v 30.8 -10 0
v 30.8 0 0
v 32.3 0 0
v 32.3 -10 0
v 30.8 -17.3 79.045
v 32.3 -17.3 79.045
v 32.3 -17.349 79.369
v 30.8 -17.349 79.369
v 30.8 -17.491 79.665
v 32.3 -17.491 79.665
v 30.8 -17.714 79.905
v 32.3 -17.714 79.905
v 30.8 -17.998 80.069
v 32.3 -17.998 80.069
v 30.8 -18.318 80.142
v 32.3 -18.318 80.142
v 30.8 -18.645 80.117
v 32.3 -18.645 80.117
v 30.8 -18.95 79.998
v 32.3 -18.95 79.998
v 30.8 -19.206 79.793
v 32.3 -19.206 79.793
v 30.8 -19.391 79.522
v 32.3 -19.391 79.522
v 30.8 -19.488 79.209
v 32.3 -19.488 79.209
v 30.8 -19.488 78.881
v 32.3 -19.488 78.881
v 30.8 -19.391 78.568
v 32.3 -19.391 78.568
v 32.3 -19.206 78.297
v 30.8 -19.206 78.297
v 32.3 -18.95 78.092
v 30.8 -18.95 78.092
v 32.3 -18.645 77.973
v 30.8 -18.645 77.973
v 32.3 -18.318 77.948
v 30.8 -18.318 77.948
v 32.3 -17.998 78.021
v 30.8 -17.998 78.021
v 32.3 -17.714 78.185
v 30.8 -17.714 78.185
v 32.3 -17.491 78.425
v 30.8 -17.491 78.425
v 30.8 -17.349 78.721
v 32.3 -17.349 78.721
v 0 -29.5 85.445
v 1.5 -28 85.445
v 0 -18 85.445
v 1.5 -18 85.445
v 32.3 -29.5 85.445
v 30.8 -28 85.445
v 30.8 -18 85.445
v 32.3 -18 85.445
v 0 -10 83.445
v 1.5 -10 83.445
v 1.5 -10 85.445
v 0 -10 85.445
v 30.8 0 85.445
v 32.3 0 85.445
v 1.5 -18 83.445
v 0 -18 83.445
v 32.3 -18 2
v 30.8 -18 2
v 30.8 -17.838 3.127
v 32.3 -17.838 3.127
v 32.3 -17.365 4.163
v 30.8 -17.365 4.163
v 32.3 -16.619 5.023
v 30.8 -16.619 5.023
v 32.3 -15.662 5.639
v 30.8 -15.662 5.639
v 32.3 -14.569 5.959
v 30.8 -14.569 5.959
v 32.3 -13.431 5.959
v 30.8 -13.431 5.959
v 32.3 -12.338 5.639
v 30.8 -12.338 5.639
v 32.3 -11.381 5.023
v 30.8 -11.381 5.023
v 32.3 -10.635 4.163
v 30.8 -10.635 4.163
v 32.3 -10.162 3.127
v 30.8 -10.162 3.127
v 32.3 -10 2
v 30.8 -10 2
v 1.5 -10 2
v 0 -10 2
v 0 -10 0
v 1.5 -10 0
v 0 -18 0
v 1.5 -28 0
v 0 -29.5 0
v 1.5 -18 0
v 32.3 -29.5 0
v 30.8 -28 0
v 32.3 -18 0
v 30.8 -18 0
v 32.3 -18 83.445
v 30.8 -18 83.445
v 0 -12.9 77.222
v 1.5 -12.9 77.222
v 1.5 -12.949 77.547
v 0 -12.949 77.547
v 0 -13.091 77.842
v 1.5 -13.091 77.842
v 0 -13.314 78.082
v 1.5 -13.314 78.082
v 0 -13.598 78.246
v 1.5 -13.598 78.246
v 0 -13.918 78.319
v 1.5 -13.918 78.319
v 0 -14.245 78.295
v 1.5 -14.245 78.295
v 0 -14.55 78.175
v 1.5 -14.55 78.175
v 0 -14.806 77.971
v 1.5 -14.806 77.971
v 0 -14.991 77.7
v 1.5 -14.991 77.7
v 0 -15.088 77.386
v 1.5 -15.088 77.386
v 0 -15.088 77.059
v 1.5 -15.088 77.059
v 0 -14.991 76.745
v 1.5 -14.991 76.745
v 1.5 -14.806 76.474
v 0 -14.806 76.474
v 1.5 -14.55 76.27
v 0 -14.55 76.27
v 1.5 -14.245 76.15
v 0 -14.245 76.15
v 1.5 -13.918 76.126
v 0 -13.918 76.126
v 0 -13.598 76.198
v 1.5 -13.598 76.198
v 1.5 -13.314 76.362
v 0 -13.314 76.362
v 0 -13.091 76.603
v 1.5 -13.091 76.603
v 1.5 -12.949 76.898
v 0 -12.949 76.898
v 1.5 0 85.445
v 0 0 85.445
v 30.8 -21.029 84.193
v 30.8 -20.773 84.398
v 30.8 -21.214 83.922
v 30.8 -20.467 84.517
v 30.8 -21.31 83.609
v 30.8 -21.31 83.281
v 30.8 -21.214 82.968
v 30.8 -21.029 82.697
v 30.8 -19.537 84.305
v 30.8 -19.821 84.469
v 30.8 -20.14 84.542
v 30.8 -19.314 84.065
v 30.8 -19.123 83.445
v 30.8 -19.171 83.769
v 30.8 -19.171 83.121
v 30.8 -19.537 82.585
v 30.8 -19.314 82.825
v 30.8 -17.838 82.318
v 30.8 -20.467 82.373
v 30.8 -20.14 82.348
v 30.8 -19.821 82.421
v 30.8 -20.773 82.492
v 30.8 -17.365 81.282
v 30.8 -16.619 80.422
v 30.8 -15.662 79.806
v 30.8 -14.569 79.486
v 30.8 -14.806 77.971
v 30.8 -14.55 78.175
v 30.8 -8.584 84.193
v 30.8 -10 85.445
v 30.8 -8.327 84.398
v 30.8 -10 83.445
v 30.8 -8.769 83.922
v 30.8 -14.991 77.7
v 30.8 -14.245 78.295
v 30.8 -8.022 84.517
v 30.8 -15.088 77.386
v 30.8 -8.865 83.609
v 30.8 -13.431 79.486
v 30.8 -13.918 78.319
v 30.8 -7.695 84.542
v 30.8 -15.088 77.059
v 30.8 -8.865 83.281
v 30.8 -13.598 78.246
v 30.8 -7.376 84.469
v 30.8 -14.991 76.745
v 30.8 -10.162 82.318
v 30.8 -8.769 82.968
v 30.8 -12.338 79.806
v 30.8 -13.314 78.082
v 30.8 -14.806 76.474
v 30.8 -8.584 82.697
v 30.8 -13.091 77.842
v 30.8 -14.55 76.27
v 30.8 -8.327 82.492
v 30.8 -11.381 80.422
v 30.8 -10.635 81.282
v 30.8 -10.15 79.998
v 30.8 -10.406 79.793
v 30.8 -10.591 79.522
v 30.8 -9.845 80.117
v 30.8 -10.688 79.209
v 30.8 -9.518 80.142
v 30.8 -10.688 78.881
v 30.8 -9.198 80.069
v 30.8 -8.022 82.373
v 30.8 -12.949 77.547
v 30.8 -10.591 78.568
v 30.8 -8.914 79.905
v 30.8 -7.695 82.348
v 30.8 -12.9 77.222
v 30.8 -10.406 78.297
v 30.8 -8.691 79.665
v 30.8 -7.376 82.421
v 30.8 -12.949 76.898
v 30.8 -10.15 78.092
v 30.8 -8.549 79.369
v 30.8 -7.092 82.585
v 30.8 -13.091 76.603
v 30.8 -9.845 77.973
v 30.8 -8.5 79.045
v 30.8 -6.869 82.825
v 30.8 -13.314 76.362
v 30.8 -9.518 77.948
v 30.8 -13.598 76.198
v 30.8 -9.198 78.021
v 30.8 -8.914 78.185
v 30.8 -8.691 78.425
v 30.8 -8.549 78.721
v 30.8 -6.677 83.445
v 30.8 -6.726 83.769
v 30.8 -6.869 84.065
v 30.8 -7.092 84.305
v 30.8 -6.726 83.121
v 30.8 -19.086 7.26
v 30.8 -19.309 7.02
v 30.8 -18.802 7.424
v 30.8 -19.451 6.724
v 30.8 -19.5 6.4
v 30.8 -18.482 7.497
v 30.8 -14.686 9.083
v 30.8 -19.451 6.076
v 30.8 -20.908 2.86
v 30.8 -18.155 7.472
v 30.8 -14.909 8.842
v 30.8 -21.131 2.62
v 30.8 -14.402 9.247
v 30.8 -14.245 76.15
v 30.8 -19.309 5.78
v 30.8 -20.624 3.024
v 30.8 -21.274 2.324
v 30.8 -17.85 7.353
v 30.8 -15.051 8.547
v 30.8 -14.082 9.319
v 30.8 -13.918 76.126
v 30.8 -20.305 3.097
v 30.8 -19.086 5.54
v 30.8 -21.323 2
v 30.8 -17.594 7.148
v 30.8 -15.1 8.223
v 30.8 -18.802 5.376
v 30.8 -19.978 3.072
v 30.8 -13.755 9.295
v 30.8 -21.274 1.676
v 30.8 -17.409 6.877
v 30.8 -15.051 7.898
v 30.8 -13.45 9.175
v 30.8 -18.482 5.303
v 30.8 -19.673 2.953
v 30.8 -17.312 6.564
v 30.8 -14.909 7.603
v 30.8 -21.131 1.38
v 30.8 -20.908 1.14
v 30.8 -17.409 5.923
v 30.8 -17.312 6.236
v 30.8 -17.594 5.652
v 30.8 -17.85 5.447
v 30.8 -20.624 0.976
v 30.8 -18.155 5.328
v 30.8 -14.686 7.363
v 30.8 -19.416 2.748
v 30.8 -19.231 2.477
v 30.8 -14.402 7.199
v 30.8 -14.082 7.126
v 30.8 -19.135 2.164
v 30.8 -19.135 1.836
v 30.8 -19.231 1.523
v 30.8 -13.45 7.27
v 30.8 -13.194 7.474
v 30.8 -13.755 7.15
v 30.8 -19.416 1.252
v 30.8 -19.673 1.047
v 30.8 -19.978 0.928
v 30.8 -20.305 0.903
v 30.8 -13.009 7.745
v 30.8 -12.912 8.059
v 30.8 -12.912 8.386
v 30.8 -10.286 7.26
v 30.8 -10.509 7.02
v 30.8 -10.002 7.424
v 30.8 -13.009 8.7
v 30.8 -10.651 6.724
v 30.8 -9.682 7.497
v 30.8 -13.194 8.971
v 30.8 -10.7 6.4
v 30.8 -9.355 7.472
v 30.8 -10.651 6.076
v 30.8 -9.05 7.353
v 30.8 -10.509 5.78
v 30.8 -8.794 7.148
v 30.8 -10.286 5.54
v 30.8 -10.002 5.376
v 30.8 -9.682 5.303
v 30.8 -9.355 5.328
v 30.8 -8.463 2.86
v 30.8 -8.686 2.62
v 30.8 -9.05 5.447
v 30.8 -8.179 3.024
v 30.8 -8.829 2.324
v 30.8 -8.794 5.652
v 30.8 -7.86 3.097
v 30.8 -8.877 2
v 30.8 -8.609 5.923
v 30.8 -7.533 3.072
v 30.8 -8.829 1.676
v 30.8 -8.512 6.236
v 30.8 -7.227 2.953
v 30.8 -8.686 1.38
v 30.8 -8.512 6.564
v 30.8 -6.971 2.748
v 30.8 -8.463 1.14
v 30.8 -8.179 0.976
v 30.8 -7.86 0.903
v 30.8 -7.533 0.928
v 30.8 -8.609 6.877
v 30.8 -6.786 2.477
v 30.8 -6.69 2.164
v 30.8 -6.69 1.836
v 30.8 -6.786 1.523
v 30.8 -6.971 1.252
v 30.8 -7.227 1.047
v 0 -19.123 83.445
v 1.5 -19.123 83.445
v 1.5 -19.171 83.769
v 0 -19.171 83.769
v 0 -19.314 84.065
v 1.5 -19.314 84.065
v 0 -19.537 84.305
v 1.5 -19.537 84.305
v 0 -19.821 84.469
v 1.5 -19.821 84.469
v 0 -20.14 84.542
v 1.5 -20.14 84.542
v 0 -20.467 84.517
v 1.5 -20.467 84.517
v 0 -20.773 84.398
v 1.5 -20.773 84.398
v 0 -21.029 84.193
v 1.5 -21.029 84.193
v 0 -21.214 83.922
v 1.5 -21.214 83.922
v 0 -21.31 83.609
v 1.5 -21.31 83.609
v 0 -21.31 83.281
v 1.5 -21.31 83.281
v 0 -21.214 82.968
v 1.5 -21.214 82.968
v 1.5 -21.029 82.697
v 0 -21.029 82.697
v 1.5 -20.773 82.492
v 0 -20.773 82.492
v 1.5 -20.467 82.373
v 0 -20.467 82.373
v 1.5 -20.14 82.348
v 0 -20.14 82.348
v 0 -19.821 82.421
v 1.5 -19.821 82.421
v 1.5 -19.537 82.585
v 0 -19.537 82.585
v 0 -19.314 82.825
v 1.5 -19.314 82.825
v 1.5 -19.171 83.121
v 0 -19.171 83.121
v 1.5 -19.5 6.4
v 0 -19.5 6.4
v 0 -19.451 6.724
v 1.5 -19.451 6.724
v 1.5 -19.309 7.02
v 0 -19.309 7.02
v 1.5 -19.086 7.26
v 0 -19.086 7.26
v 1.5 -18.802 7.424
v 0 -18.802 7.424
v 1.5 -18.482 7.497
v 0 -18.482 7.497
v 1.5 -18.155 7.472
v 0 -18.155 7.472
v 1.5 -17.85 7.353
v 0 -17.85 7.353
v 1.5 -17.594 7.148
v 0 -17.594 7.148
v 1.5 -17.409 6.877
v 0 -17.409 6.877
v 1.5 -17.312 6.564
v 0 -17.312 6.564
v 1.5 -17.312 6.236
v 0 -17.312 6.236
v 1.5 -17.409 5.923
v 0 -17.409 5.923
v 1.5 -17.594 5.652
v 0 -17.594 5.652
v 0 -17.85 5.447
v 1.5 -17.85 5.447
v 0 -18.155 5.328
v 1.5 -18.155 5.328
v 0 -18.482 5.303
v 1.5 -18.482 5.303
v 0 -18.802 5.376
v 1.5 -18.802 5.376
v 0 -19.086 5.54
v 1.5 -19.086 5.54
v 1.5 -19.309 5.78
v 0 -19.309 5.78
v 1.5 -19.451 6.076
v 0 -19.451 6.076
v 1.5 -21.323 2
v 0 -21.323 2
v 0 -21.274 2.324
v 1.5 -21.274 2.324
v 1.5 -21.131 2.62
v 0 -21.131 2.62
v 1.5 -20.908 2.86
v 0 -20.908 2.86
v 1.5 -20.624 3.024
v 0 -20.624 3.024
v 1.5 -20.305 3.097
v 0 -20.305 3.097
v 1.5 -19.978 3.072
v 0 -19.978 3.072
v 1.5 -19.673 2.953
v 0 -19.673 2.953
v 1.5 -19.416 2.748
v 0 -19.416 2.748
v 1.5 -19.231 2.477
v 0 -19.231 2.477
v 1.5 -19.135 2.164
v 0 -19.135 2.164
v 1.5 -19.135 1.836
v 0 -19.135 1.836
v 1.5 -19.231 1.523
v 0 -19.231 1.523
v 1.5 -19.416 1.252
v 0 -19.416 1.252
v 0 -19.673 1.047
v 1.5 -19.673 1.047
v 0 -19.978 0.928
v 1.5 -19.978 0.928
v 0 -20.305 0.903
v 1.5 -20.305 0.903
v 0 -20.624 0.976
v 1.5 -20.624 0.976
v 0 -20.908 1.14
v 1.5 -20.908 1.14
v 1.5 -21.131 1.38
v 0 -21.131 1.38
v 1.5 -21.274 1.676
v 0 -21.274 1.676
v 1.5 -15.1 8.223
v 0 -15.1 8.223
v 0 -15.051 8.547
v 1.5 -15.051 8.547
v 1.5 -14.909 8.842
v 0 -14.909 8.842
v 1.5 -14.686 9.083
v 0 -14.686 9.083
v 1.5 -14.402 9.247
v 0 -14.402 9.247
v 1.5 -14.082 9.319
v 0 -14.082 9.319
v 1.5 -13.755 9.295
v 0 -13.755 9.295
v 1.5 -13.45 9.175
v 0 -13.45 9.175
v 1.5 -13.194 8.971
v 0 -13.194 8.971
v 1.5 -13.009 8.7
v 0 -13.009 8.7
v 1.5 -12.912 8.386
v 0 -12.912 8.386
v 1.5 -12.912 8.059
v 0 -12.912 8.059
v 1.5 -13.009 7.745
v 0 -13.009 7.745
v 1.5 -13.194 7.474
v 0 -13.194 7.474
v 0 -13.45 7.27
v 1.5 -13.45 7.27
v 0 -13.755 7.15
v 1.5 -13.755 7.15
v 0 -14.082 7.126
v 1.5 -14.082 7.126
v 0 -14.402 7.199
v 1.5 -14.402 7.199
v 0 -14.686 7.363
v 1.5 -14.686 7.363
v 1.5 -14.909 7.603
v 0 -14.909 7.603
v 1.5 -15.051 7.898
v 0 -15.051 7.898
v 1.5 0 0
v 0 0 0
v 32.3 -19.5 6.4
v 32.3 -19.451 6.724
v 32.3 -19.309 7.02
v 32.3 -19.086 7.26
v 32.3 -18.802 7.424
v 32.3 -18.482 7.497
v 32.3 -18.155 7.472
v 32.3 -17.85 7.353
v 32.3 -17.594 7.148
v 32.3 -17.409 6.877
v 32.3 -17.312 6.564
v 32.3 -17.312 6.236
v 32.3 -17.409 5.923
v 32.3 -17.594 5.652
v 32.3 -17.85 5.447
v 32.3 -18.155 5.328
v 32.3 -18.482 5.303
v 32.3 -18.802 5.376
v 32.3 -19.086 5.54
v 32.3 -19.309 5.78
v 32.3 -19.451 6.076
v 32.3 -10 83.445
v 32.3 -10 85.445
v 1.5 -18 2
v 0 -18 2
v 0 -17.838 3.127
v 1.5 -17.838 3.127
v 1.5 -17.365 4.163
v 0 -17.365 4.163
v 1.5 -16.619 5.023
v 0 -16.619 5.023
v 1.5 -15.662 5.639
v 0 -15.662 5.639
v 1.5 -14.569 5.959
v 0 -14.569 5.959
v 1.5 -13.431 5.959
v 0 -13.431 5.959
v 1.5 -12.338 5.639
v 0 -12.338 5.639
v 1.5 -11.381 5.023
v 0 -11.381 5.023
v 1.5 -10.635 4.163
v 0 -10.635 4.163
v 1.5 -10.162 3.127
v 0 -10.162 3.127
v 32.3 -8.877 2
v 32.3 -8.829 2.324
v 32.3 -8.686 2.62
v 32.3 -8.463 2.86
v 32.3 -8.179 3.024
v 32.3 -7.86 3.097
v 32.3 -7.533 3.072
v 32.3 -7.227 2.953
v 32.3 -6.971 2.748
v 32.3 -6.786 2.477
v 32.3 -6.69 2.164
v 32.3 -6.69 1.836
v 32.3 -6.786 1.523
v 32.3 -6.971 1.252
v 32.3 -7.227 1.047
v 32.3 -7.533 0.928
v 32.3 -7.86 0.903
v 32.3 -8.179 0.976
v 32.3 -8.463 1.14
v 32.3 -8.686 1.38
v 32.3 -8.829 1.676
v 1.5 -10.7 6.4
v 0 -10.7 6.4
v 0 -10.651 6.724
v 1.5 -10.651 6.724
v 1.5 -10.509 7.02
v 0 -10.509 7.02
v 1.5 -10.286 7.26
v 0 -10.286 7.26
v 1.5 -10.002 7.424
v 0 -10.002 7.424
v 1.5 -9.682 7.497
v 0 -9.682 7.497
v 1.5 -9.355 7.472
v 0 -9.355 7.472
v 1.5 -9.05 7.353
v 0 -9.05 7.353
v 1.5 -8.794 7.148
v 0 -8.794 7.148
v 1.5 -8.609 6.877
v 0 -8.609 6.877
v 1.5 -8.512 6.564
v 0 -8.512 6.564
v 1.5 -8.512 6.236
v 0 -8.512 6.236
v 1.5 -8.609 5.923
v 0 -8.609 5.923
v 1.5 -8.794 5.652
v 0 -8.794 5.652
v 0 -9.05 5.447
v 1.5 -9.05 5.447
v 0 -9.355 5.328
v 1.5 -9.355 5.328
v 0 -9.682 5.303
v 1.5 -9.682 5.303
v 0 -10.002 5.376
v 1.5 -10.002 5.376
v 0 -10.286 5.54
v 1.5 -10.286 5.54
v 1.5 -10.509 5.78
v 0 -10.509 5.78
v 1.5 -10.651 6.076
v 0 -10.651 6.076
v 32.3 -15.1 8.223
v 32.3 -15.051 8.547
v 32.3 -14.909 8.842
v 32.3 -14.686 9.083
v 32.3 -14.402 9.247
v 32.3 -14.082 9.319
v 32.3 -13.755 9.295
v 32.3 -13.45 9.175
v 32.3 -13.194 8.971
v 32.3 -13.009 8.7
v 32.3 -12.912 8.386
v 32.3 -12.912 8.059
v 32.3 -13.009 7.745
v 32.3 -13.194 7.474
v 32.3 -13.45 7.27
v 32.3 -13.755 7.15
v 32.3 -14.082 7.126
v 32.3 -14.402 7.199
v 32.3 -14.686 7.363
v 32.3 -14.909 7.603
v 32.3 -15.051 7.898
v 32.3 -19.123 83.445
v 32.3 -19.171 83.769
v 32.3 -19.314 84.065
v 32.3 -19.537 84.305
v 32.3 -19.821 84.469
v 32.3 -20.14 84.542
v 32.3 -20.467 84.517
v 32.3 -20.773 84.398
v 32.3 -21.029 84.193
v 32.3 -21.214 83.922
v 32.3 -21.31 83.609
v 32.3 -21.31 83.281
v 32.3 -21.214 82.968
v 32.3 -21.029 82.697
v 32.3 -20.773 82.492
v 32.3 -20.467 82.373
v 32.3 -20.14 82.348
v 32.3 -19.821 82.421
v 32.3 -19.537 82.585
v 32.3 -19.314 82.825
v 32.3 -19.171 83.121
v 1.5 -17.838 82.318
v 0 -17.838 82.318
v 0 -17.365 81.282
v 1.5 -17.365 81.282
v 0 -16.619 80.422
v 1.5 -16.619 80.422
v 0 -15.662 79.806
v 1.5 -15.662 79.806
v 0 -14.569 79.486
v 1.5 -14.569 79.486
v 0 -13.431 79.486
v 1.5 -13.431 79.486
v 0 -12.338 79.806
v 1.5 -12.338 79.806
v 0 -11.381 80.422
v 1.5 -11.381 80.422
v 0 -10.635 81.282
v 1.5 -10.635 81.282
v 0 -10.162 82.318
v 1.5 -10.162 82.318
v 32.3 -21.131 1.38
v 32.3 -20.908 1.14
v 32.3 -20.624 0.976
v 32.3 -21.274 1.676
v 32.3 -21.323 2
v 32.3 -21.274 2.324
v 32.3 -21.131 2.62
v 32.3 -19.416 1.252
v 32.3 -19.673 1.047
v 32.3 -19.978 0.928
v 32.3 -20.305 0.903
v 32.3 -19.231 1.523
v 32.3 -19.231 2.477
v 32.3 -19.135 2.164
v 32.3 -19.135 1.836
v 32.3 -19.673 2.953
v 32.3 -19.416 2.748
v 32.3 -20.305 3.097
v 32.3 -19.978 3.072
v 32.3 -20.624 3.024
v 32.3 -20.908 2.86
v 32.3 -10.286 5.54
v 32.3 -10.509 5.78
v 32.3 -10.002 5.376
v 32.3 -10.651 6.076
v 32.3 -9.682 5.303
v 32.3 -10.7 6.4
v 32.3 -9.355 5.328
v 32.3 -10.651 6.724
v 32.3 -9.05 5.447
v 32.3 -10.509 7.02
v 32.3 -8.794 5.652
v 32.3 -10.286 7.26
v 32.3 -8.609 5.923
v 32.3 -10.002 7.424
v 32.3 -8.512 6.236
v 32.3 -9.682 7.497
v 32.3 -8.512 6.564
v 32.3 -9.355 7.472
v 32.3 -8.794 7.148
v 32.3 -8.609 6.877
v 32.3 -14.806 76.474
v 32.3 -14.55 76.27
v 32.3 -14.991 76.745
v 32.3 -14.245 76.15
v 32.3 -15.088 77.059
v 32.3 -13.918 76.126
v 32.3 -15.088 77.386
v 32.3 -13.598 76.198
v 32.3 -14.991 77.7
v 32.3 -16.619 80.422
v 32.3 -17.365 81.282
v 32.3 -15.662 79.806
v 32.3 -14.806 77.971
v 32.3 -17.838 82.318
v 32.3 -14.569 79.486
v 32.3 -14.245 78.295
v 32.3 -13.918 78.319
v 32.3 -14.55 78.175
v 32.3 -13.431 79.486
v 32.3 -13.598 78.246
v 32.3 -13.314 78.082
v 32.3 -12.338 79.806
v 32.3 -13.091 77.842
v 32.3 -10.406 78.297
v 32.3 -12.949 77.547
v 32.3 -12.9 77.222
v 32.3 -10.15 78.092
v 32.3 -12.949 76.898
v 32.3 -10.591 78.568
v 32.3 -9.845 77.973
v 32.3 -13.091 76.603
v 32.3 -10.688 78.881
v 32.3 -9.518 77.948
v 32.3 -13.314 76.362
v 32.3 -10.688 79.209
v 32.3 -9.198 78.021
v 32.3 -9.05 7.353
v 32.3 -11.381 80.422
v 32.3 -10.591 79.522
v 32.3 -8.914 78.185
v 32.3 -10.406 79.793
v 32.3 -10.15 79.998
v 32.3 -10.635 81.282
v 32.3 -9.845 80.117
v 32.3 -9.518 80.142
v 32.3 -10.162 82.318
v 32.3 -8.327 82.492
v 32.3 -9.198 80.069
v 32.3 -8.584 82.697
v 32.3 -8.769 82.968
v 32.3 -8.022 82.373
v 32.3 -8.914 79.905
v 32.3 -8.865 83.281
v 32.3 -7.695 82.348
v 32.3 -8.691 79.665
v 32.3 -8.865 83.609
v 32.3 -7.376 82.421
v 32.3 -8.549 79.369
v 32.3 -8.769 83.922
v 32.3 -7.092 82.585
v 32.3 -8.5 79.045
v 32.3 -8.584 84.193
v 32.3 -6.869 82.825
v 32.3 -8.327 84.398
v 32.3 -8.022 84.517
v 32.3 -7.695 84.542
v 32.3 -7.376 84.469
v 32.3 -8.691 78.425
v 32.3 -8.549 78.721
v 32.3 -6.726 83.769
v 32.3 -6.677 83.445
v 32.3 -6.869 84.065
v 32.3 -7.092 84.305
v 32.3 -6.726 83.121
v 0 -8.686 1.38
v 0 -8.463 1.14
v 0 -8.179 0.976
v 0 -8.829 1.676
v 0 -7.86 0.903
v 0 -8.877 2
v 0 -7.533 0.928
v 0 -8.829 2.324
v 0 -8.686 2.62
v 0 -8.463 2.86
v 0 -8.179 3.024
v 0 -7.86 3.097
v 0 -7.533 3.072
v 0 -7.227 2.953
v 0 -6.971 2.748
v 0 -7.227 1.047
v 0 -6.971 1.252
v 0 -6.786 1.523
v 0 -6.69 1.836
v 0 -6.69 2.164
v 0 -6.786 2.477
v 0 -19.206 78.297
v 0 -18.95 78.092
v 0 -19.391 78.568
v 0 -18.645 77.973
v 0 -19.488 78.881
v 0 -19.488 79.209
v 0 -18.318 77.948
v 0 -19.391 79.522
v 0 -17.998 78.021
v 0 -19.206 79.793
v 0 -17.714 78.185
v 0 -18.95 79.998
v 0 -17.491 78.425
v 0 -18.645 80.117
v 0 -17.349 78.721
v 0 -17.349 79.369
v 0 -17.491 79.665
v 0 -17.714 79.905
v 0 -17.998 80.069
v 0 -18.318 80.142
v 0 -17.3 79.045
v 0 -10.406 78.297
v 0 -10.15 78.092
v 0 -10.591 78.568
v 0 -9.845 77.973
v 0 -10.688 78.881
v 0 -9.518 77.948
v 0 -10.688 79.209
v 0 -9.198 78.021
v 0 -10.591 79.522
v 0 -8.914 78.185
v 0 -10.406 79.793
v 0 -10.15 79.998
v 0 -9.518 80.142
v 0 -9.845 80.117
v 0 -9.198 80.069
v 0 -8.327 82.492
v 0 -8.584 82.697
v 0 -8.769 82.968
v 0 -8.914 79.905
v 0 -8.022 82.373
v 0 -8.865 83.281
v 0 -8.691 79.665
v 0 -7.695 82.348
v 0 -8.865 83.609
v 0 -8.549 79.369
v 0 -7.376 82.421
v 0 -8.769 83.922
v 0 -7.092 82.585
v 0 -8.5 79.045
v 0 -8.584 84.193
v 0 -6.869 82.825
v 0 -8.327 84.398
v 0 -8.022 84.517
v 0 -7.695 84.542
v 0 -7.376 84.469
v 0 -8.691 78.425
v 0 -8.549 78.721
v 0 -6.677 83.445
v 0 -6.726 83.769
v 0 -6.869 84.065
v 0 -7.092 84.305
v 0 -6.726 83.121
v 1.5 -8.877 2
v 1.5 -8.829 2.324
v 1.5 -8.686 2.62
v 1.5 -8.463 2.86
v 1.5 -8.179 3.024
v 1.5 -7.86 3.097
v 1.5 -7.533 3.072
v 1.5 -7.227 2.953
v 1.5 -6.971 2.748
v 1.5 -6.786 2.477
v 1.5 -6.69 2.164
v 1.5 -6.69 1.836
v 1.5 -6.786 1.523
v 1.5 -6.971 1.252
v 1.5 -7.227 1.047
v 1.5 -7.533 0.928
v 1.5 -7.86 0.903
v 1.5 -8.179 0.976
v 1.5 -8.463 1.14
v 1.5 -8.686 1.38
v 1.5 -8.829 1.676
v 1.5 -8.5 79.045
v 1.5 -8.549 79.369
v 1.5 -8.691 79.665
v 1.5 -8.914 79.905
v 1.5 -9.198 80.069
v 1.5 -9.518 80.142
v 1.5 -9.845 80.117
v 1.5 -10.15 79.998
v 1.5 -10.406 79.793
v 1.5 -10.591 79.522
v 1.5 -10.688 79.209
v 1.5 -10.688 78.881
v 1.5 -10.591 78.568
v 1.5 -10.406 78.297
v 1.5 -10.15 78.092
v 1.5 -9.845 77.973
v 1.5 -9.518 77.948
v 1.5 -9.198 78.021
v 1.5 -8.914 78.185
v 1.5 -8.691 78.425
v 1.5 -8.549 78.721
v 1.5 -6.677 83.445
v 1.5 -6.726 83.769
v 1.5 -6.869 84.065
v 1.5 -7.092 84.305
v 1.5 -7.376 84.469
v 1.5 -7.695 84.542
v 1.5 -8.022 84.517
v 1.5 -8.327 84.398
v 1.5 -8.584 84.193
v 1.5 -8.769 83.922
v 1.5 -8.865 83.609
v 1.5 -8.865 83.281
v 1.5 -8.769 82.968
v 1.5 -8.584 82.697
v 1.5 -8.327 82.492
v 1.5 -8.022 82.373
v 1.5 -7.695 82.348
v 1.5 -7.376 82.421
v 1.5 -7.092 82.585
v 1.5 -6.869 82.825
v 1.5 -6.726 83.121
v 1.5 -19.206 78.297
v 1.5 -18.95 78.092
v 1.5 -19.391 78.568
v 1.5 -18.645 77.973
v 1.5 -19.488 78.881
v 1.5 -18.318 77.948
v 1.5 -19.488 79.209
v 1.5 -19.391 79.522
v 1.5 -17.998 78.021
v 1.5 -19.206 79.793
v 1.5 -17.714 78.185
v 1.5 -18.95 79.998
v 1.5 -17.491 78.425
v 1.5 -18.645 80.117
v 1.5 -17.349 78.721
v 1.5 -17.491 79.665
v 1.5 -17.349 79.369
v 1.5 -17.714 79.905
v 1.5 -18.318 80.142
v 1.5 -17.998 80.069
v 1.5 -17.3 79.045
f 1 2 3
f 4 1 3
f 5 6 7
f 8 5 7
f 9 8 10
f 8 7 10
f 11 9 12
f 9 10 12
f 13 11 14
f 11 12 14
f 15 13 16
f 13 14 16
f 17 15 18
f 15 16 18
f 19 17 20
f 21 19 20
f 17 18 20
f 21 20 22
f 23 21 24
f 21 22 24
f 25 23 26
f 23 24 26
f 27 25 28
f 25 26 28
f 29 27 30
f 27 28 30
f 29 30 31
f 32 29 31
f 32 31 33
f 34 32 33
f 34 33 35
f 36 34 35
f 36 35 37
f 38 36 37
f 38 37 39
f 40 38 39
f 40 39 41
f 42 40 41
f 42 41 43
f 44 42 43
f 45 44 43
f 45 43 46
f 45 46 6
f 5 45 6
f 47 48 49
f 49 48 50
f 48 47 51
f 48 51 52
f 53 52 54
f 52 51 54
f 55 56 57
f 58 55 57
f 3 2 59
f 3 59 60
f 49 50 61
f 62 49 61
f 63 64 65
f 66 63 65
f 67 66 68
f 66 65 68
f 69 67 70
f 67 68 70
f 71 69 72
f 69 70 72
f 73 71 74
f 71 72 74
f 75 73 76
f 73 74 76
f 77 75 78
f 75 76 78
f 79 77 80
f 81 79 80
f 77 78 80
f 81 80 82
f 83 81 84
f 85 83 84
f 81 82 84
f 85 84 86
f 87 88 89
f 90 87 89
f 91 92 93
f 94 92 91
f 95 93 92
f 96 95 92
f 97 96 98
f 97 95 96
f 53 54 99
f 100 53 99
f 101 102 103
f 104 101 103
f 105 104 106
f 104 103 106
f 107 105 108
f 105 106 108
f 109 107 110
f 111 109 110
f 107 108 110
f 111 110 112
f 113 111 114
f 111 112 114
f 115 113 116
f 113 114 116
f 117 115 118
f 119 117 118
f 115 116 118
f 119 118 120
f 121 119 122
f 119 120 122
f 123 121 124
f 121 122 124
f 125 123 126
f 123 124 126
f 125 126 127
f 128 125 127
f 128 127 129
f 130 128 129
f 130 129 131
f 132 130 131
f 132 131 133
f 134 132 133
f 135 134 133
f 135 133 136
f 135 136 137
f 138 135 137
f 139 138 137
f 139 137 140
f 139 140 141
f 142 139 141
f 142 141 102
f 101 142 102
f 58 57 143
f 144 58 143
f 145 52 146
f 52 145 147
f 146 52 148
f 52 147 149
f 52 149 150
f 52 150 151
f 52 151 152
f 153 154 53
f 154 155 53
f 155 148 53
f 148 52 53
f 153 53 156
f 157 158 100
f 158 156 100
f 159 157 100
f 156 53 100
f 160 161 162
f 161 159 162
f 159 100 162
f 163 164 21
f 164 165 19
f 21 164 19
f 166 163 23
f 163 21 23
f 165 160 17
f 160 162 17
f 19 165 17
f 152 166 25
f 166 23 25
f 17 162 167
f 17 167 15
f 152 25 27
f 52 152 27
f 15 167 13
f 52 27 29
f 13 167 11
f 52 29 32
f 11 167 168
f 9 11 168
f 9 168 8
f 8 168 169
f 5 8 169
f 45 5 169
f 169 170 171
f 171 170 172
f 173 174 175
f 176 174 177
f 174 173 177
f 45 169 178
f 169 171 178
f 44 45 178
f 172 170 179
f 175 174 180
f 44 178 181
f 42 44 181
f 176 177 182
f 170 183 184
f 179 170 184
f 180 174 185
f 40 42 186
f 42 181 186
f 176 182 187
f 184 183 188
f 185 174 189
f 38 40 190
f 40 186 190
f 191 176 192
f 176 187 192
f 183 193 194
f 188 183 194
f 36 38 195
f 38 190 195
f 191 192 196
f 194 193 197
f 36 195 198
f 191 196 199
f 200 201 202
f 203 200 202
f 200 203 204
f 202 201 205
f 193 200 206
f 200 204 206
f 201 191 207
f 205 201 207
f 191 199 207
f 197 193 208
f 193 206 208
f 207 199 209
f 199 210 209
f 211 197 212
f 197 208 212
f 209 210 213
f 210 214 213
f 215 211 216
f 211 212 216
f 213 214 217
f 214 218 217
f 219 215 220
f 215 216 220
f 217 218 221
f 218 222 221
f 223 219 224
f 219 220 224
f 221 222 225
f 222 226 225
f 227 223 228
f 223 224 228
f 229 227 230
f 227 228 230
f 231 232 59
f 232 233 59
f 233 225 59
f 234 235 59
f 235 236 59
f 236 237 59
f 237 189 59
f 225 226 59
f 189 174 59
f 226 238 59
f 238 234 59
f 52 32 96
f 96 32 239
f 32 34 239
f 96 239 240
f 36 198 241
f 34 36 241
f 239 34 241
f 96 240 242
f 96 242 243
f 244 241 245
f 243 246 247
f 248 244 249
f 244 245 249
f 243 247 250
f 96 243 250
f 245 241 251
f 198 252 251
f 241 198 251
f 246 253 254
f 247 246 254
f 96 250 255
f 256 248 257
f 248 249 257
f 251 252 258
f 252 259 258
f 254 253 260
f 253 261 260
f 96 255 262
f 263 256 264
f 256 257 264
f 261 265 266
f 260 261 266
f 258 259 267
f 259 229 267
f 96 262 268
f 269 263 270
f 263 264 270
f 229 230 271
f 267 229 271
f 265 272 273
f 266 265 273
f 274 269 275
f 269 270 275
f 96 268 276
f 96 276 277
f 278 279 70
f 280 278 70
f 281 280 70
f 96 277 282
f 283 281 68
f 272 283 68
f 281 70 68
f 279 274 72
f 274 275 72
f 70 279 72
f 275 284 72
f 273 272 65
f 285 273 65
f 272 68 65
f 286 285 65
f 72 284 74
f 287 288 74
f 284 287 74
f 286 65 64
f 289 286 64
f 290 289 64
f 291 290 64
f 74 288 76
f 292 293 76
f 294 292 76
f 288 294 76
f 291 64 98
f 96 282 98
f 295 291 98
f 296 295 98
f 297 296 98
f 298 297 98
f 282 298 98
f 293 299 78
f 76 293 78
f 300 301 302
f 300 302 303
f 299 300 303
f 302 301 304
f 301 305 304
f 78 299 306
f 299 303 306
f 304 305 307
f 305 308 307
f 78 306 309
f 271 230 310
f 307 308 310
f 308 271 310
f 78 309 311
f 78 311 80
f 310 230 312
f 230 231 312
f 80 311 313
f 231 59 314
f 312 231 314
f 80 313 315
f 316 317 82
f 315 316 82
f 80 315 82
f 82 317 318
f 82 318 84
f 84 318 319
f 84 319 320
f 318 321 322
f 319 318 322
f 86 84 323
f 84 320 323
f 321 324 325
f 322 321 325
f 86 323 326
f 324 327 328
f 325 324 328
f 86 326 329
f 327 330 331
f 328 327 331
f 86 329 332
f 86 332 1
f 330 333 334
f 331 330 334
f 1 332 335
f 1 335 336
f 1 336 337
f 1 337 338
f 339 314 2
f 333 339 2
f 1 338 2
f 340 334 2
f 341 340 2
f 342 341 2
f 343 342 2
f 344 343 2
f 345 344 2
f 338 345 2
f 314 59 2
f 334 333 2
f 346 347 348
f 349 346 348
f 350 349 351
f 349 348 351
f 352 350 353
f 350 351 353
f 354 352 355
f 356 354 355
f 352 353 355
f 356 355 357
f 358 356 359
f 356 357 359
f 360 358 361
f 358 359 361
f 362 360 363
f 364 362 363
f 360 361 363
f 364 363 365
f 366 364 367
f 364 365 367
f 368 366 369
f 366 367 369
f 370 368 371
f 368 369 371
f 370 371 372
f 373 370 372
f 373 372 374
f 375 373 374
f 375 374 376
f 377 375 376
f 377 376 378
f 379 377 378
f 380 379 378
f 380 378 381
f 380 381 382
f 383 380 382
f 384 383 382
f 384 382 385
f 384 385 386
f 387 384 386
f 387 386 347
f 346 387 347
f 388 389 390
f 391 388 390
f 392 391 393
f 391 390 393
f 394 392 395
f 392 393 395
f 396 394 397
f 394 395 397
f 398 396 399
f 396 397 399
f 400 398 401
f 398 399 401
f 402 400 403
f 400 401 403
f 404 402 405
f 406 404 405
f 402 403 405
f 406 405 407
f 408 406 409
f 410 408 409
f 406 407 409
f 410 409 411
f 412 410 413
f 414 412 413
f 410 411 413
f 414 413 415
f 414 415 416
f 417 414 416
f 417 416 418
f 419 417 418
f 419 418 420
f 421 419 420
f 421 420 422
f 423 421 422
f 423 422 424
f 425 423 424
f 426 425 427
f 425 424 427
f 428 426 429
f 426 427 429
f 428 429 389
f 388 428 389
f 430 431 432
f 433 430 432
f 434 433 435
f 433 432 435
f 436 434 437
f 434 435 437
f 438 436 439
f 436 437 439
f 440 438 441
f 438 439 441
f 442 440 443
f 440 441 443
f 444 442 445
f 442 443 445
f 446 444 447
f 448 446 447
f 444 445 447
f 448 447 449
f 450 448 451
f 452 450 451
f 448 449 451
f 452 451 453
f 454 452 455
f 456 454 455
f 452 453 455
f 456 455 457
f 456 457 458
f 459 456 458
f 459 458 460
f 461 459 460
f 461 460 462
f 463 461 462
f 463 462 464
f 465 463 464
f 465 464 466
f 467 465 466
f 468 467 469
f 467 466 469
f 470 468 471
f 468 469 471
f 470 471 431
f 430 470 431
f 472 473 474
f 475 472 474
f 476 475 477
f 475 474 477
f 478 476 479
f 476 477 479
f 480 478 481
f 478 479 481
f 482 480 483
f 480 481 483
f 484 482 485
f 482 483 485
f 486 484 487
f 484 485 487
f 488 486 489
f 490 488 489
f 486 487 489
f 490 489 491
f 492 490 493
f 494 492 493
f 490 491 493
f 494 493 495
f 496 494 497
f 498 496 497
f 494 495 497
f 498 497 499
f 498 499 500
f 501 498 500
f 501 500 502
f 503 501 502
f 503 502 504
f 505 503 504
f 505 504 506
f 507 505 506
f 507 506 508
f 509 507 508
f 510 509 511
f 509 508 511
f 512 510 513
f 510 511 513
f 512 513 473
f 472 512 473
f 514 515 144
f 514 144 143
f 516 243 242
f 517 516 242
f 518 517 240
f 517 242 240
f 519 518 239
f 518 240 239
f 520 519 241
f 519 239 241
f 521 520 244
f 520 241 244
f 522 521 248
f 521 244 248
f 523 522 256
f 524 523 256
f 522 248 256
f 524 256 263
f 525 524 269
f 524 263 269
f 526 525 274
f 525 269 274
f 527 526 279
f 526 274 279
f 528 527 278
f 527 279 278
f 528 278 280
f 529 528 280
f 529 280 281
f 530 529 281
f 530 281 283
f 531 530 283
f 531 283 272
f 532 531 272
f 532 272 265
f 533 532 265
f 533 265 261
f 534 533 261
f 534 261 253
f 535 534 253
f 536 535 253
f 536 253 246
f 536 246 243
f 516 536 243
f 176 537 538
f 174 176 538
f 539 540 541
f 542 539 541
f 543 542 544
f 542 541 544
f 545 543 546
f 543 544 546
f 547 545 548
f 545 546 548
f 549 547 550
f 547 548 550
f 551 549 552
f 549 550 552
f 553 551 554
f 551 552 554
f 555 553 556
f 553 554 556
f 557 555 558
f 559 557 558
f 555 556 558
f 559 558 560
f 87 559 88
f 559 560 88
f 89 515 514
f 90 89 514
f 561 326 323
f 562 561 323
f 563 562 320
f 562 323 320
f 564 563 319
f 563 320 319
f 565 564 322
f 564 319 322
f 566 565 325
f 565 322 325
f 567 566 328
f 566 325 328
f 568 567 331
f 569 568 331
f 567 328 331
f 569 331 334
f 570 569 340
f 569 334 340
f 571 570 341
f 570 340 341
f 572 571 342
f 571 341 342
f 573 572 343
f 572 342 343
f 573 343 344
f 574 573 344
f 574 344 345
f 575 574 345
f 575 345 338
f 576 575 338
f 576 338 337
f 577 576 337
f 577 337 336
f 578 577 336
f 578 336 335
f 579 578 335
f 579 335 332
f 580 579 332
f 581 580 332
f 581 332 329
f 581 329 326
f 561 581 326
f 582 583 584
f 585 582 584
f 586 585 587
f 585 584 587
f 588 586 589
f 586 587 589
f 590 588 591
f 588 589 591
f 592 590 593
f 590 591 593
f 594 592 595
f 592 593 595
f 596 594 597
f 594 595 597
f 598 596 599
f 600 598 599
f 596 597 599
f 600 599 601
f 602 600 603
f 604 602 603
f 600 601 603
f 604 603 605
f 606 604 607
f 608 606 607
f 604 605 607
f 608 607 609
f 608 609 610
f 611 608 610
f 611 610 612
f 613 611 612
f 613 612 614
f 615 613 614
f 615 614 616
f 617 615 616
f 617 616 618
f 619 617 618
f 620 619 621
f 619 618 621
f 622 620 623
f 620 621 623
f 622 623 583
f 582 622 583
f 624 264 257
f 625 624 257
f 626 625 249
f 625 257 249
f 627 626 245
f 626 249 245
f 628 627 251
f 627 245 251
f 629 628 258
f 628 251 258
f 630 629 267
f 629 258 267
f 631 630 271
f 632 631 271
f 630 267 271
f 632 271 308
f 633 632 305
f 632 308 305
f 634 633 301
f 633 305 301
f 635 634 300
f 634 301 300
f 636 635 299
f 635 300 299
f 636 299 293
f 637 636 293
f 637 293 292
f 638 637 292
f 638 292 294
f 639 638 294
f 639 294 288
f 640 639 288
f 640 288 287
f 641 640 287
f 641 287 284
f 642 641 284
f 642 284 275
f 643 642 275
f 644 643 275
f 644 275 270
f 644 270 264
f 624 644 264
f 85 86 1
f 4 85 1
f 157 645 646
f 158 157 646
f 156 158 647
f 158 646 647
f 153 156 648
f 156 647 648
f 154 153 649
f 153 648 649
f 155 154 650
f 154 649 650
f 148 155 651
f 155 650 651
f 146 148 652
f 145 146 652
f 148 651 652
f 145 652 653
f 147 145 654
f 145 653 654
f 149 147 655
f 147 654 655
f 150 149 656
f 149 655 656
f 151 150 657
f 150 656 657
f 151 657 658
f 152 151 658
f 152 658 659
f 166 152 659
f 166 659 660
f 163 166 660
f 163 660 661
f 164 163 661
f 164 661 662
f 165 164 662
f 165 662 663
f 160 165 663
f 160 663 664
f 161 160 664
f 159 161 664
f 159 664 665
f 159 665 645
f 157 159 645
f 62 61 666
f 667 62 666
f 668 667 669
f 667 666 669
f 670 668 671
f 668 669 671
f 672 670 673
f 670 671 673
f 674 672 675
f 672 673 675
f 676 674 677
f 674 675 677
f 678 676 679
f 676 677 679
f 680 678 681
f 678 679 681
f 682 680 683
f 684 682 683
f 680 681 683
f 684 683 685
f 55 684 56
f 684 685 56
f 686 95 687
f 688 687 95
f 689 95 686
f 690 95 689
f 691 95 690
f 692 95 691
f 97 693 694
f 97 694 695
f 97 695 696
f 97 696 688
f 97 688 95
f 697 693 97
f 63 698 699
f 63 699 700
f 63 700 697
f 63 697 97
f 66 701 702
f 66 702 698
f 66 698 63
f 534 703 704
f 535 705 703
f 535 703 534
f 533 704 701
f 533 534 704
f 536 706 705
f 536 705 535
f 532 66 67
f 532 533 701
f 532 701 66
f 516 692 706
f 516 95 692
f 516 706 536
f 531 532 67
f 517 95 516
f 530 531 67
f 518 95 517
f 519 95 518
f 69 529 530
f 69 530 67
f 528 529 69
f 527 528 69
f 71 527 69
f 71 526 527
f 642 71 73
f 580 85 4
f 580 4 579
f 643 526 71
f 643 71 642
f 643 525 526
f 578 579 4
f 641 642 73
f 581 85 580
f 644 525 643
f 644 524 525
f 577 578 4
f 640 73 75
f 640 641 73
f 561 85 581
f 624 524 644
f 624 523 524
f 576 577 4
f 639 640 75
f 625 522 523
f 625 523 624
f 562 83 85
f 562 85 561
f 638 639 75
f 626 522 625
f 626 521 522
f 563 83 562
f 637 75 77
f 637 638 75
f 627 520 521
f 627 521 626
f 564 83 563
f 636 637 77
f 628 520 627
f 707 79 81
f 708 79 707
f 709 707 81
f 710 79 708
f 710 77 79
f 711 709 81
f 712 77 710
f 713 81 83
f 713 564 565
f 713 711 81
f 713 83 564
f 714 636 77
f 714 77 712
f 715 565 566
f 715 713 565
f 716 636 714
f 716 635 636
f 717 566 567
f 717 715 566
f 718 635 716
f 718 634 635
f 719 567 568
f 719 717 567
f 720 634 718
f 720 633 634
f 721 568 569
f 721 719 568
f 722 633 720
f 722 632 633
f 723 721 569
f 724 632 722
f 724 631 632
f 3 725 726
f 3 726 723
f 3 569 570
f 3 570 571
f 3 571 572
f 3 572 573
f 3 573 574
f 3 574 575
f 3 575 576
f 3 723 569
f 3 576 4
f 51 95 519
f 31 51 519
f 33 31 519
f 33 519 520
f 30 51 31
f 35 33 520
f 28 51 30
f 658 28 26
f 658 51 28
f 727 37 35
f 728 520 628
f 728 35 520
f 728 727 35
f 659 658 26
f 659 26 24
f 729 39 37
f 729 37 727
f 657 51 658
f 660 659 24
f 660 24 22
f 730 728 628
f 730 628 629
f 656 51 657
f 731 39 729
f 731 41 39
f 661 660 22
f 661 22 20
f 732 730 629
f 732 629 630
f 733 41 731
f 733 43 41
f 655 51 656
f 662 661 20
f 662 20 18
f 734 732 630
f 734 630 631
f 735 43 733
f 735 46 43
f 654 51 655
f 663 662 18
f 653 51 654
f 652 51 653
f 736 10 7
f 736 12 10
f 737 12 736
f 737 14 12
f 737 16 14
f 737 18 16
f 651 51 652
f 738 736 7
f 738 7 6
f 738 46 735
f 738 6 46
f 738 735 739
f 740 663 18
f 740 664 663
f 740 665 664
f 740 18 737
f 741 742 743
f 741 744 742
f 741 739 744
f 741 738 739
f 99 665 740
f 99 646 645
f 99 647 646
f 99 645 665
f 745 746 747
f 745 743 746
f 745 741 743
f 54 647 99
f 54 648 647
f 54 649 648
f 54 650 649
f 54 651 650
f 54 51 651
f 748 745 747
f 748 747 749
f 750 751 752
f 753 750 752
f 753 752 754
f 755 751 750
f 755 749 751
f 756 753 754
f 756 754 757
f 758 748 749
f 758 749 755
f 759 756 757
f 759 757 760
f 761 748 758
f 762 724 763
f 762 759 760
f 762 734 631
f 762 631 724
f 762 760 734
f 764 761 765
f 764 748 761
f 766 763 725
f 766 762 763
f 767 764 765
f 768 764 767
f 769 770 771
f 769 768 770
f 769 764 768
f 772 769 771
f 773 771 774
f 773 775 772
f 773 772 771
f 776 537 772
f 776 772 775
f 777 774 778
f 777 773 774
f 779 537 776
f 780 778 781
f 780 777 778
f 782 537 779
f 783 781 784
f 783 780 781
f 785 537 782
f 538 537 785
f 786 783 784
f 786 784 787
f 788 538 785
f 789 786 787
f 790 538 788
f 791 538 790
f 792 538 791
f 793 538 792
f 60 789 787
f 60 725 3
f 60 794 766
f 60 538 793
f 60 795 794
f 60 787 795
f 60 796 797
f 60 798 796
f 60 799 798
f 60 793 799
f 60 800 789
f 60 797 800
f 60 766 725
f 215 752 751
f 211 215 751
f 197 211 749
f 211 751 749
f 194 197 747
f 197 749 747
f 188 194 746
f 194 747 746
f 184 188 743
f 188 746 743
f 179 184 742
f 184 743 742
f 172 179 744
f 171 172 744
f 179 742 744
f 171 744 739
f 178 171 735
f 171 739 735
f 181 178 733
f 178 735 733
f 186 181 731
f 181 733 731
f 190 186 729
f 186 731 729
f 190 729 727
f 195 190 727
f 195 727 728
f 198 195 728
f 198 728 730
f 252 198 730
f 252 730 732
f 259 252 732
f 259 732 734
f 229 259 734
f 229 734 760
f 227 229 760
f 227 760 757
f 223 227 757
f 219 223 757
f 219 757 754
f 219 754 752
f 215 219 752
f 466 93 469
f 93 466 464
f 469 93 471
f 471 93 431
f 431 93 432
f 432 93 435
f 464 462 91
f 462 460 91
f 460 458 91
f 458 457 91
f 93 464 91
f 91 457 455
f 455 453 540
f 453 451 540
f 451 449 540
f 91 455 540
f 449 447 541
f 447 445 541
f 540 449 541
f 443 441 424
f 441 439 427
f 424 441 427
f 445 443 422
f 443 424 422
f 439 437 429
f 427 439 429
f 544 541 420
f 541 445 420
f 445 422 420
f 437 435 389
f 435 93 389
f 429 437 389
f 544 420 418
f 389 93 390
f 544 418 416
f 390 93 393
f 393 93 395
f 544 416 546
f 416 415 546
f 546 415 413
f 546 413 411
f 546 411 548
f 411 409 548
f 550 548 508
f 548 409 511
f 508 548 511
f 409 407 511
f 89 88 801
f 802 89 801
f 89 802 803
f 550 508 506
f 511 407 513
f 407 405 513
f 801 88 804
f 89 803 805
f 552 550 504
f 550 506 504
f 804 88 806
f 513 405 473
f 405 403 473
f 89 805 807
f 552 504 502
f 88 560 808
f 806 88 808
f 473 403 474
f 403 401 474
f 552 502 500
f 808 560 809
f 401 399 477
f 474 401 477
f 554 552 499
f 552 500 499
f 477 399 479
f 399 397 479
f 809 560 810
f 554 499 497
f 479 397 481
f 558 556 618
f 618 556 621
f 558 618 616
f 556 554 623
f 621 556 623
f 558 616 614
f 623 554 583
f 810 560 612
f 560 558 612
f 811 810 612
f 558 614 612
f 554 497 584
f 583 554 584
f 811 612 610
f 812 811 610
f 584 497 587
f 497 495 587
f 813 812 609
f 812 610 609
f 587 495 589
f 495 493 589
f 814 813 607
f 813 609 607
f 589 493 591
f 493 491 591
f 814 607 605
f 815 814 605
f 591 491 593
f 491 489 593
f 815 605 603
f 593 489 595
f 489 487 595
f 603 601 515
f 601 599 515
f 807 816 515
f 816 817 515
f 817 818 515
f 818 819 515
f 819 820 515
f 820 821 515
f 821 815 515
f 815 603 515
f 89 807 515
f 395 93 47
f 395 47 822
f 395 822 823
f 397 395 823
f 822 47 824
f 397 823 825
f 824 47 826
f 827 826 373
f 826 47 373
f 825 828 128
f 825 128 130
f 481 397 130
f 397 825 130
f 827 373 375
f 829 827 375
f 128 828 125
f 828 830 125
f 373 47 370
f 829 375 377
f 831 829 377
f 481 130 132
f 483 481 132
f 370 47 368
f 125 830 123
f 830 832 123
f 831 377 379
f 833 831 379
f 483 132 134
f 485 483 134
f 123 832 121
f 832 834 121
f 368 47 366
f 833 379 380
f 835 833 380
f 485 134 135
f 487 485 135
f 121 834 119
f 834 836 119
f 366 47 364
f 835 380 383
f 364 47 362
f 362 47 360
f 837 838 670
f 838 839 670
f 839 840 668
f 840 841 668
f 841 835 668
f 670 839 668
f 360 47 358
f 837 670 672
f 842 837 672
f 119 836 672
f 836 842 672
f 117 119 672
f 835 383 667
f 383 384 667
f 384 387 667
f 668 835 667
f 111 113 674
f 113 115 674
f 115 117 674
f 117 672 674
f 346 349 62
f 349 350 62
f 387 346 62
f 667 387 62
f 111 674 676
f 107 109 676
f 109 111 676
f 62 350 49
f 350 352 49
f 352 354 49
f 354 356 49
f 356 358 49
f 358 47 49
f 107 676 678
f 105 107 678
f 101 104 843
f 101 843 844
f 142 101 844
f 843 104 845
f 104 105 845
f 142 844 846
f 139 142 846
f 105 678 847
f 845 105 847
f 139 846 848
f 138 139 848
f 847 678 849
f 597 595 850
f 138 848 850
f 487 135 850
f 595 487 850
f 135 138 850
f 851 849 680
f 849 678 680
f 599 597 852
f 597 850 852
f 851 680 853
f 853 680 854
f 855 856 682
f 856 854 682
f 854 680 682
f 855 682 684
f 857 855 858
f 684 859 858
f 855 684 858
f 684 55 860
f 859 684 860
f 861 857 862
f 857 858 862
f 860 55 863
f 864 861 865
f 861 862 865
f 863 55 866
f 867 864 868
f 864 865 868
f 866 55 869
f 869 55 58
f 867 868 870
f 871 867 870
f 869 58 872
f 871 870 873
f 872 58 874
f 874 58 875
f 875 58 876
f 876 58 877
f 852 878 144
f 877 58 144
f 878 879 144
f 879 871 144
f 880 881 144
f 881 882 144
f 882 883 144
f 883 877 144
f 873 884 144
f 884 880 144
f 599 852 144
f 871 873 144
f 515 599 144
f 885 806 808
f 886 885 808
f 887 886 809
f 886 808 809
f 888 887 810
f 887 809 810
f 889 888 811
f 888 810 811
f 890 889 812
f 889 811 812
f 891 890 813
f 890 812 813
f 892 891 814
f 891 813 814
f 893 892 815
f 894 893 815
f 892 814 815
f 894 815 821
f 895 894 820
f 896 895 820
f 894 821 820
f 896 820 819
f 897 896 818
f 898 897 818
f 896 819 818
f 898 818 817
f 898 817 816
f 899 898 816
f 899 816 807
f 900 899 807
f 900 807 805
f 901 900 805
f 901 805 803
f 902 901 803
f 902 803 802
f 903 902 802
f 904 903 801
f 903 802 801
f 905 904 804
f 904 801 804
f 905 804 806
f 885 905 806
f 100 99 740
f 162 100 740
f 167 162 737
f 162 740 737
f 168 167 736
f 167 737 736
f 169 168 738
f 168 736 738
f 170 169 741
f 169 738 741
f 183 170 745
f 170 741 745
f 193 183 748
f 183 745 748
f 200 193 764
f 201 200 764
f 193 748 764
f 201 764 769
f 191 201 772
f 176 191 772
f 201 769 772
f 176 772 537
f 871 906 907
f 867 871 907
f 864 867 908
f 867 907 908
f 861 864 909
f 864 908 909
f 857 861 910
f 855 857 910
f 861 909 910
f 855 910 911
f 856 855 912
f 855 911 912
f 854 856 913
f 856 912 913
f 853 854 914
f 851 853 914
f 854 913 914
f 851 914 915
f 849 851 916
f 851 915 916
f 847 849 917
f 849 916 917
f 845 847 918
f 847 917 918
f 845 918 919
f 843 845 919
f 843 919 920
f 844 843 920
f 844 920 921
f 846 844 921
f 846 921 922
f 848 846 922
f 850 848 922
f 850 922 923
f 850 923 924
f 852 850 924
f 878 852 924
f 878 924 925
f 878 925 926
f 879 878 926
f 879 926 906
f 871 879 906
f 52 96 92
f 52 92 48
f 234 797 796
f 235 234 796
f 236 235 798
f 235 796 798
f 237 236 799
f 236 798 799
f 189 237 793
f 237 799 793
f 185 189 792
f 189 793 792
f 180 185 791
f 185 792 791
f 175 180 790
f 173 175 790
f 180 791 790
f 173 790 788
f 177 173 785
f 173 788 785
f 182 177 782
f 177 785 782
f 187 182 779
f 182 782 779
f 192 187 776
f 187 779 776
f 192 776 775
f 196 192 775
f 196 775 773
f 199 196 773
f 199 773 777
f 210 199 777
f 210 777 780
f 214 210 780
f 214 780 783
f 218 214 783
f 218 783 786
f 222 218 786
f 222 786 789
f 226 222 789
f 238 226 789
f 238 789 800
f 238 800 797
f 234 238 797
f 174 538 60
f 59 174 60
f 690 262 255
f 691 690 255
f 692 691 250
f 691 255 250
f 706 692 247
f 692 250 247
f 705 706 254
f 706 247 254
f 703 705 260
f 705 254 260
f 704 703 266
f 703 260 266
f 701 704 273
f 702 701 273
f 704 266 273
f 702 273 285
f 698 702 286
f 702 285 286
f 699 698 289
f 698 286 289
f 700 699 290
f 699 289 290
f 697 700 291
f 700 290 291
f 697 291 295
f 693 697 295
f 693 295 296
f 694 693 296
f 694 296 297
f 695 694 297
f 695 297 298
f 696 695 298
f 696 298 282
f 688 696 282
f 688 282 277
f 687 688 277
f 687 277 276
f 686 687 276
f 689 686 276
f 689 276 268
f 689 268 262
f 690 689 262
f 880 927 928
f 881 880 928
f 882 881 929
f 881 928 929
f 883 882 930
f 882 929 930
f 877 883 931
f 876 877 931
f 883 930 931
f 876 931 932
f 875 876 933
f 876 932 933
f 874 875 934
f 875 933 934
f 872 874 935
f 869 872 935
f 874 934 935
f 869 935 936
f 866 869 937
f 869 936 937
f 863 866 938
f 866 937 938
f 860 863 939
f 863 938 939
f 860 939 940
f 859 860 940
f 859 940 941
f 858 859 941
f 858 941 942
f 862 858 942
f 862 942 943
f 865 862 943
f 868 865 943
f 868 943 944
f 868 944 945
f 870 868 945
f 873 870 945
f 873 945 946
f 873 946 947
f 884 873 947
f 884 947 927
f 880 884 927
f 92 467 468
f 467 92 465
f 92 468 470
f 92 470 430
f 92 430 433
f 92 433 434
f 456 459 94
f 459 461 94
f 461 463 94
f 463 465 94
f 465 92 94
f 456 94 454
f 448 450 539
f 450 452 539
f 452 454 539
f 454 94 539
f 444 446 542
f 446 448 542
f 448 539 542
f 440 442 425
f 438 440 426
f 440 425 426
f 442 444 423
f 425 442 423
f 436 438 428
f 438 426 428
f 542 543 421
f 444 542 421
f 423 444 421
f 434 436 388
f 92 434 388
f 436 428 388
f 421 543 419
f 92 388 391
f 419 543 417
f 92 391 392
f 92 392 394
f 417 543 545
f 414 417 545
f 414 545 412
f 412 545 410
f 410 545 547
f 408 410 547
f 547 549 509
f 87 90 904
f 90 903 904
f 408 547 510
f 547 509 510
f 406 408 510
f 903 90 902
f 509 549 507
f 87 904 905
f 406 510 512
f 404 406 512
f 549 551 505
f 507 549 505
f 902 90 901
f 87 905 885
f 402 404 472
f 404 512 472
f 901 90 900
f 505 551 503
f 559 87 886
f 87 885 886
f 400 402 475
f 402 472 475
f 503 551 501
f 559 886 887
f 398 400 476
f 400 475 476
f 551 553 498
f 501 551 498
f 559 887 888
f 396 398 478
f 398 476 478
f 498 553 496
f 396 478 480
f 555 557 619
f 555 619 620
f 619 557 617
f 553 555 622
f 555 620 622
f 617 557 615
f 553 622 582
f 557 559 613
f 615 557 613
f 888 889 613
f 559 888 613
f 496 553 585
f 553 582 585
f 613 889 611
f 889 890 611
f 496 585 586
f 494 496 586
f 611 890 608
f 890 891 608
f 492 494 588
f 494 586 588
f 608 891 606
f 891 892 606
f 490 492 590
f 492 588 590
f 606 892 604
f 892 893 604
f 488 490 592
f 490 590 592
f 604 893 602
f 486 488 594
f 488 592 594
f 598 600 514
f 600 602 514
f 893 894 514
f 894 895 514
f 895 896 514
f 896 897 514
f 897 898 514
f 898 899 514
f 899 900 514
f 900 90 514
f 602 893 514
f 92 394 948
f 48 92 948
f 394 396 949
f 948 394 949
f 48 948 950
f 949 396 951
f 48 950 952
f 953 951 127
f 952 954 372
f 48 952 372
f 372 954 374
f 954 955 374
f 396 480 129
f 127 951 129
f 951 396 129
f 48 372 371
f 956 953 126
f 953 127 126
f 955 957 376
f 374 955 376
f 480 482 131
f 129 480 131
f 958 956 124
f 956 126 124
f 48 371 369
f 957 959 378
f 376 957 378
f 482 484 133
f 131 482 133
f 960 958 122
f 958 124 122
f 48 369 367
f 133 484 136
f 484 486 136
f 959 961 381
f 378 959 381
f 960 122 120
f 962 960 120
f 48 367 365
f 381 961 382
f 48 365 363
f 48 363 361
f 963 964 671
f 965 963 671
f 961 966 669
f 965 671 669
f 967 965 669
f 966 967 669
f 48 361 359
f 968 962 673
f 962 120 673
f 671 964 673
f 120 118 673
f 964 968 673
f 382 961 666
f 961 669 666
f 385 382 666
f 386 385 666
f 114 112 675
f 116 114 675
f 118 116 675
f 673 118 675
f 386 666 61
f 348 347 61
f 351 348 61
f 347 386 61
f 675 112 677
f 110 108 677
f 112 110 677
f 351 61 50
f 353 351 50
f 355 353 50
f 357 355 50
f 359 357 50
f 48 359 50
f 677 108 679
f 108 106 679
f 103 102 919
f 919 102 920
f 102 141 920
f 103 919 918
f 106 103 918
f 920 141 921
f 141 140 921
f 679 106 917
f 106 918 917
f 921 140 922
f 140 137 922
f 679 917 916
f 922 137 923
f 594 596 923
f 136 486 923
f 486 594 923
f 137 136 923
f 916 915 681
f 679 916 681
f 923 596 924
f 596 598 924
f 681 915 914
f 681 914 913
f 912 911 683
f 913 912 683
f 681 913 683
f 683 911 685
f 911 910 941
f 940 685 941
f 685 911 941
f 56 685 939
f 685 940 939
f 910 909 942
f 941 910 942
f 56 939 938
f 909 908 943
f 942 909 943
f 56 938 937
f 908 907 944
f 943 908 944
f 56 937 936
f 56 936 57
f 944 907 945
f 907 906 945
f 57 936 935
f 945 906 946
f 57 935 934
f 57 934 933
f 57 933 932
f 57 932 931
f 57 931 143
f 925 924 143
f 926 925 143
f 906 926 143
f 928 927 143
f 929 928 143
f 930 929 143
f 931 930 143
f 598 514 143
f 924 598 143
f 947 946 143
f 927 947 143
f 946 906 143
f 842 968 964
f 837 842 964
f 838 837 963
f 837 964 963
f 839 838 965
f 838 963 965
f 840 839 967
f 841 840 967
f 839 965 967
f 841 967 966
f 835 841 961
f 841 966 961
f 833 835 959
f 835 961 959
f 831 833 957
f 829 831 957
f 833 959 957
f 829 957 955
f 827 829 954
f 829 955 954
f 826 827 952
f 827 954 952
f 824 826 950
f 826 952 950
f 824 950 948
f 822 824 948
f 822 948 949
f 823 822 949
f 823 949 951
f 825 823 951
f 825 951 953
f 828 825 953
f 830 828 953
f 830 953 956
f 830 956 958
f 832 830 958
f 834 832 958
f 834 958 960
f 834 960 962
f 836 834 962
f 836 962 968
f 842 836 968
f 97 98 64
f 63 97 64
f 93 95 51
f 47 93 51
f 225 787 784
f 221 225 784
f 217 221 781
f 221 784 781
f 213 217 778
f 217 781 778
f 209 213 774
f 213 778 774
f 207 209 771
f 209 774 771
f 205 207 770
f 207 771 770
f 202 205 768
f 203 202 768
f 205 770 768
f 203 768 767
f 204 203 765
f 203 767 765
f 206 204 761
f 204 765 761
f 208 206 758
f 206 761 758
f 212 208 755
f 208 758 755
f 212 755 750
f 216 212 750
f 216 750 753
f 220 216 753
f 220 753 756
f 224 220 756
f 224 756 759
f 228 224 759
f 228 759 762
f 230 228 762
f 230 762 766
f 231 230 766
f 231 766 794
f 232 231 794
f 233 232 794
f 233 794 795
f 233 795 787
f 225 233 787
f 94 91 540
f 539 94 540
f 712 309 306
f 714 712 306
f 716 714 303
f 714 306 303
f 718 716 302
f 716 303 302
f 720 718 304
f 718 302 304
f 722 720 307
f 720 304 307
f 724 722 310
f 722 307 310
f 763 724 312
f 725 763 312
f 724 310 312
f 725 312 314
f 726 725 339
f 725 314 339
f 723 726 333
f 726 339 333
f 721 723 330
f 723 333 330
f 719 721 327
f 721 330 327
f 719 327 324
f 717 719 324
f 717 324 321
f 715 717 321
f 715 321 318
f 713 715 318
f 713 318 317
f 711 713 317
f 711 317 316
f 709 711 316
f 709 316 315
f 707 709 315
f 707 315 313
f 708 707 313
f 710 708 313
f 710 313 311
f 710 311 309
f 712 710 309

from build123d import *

# Parameters (mm, degrees)
F1_DEPTH = 28
F2_R     = 1.1
F3_DEPTH = 32.301
F4_R     = 1.1
F5_DEPTH = 1.5
F6_W     = 1.5
F6_H     = 86.945
F7_DEPTH = 32.3
F8_R     = 1.1
F9_DEPTH = 32.301


with BuildPart() as f1:
    # F0 (on Front) → F1 (new body)
    with BuildSketch(Plane.XZ):
        Polygon((0, 86.945), (0, 0), (1.5, 0), (1.5, 85.445), (30.8, 85.445), (30.8, 0), (32.3, 0), (32.3, 86.945), align=None)
    extrude(amount=F1_DEPTH)

    # F2 (on face) → F3 (cut, through all)
    with BuildSketch(Plane(origin=(0, 0, 0), x_dir=(0, -1, 0), z_dir=(-1, 0, 0))):
        with BuildLine():
            Line((18, 0), (18, 2))
            ThreePointArc((18, 2), (14, 6), (10, 2))
            Line((10, 2), (10, 0))
            Line((10, 0), (18, 0))
        make_face()
        with Locations((20.22254, 2)):
            Circle(F2_R)
        with Locations((18.4, 6.4)):
            Circle(F2_R)
        with Locations((14, 8.22254)):
            Circle(F2_R)
        with Locations((9.6, 6.4)):
            Circle(F2_R)
        with Locations((7.77746, 2)):
            Circle(F2_R)
    extrude(amount=-F3_DEPTH, mode=Mode.SUBTRACT)

    # F4 (on face) → F5 (cut, through all)
    with BuildSketch(Plane.XY.offset(86.945)):
        with Locations((6.15, -4)):
            Circle(F4_R)
        with Locations((26.15, -4)):
            Circle(F4_R)
        with Locations((6.15, -24)):
            Circle(F4_R)
        with Locations((26.15, -24)):
            Circle(F4_R)
    extrude(amount=-F5_DEPTH, mode=Mode.SUBTRACT)

    # F6 (on face) → F7 (join)
    with BuildSketch(Plane.YZ.offset(32.3)):
        with Locations((-28.75, 43.4725)):
            Rectangle(F6_W, F6_H)
    extrude(amount=-F7_DEPTH)

    # F8 (on face) → F9 (cut, through all)
    with BuildSketch(Plane.YZ.offset(32.3)):
        Polygon((0, 86.945), (-29.5, 86.945), (-29.5, 85.445), (-18, 85.445), (-10, 85.445), (0, 85.445), align=None)
        with BuildLine():
            Line((-10, 85.445), (-18, 85.445))
            Line((-18, 85.445), (-18, 83.445))
            ThreePointArc((-18, 83.445), (-14, 79.445), (-10, 83.445))
            Line((-10, 83.445), (-10, 85.445))
        make_face()
        with Locations((-18.4, 6.4)):
            Circle(F8_R)
        with Locations((-14, 8.22254)):
            Circle(F8_R)
        with Locations((-9.6, 6.4)):
            Circle(F8_R)
        with Locations((-7.77746, 2)):
            Circle(F8_R)
        with Locations((-20.22254, 2)):
            Circle(F8_R)
        with Locations((-9.6, 79.045)):
            Circle(F8_R)
        with Locations((-18.4, 79.045)):
            Circle(F8_R)
        with Locations((-7.77746, 83.445)):
            Circle(F8_R)
        with Locations((-14, 77.22246)):
            Circle(F8_R)
        with Locations((-20.22254, 83.445)):
            Circle(F8_R)
    extrude(amount=-F9_DEPTH, mode=Mode.SUBTRACT)


solid = f1.part
